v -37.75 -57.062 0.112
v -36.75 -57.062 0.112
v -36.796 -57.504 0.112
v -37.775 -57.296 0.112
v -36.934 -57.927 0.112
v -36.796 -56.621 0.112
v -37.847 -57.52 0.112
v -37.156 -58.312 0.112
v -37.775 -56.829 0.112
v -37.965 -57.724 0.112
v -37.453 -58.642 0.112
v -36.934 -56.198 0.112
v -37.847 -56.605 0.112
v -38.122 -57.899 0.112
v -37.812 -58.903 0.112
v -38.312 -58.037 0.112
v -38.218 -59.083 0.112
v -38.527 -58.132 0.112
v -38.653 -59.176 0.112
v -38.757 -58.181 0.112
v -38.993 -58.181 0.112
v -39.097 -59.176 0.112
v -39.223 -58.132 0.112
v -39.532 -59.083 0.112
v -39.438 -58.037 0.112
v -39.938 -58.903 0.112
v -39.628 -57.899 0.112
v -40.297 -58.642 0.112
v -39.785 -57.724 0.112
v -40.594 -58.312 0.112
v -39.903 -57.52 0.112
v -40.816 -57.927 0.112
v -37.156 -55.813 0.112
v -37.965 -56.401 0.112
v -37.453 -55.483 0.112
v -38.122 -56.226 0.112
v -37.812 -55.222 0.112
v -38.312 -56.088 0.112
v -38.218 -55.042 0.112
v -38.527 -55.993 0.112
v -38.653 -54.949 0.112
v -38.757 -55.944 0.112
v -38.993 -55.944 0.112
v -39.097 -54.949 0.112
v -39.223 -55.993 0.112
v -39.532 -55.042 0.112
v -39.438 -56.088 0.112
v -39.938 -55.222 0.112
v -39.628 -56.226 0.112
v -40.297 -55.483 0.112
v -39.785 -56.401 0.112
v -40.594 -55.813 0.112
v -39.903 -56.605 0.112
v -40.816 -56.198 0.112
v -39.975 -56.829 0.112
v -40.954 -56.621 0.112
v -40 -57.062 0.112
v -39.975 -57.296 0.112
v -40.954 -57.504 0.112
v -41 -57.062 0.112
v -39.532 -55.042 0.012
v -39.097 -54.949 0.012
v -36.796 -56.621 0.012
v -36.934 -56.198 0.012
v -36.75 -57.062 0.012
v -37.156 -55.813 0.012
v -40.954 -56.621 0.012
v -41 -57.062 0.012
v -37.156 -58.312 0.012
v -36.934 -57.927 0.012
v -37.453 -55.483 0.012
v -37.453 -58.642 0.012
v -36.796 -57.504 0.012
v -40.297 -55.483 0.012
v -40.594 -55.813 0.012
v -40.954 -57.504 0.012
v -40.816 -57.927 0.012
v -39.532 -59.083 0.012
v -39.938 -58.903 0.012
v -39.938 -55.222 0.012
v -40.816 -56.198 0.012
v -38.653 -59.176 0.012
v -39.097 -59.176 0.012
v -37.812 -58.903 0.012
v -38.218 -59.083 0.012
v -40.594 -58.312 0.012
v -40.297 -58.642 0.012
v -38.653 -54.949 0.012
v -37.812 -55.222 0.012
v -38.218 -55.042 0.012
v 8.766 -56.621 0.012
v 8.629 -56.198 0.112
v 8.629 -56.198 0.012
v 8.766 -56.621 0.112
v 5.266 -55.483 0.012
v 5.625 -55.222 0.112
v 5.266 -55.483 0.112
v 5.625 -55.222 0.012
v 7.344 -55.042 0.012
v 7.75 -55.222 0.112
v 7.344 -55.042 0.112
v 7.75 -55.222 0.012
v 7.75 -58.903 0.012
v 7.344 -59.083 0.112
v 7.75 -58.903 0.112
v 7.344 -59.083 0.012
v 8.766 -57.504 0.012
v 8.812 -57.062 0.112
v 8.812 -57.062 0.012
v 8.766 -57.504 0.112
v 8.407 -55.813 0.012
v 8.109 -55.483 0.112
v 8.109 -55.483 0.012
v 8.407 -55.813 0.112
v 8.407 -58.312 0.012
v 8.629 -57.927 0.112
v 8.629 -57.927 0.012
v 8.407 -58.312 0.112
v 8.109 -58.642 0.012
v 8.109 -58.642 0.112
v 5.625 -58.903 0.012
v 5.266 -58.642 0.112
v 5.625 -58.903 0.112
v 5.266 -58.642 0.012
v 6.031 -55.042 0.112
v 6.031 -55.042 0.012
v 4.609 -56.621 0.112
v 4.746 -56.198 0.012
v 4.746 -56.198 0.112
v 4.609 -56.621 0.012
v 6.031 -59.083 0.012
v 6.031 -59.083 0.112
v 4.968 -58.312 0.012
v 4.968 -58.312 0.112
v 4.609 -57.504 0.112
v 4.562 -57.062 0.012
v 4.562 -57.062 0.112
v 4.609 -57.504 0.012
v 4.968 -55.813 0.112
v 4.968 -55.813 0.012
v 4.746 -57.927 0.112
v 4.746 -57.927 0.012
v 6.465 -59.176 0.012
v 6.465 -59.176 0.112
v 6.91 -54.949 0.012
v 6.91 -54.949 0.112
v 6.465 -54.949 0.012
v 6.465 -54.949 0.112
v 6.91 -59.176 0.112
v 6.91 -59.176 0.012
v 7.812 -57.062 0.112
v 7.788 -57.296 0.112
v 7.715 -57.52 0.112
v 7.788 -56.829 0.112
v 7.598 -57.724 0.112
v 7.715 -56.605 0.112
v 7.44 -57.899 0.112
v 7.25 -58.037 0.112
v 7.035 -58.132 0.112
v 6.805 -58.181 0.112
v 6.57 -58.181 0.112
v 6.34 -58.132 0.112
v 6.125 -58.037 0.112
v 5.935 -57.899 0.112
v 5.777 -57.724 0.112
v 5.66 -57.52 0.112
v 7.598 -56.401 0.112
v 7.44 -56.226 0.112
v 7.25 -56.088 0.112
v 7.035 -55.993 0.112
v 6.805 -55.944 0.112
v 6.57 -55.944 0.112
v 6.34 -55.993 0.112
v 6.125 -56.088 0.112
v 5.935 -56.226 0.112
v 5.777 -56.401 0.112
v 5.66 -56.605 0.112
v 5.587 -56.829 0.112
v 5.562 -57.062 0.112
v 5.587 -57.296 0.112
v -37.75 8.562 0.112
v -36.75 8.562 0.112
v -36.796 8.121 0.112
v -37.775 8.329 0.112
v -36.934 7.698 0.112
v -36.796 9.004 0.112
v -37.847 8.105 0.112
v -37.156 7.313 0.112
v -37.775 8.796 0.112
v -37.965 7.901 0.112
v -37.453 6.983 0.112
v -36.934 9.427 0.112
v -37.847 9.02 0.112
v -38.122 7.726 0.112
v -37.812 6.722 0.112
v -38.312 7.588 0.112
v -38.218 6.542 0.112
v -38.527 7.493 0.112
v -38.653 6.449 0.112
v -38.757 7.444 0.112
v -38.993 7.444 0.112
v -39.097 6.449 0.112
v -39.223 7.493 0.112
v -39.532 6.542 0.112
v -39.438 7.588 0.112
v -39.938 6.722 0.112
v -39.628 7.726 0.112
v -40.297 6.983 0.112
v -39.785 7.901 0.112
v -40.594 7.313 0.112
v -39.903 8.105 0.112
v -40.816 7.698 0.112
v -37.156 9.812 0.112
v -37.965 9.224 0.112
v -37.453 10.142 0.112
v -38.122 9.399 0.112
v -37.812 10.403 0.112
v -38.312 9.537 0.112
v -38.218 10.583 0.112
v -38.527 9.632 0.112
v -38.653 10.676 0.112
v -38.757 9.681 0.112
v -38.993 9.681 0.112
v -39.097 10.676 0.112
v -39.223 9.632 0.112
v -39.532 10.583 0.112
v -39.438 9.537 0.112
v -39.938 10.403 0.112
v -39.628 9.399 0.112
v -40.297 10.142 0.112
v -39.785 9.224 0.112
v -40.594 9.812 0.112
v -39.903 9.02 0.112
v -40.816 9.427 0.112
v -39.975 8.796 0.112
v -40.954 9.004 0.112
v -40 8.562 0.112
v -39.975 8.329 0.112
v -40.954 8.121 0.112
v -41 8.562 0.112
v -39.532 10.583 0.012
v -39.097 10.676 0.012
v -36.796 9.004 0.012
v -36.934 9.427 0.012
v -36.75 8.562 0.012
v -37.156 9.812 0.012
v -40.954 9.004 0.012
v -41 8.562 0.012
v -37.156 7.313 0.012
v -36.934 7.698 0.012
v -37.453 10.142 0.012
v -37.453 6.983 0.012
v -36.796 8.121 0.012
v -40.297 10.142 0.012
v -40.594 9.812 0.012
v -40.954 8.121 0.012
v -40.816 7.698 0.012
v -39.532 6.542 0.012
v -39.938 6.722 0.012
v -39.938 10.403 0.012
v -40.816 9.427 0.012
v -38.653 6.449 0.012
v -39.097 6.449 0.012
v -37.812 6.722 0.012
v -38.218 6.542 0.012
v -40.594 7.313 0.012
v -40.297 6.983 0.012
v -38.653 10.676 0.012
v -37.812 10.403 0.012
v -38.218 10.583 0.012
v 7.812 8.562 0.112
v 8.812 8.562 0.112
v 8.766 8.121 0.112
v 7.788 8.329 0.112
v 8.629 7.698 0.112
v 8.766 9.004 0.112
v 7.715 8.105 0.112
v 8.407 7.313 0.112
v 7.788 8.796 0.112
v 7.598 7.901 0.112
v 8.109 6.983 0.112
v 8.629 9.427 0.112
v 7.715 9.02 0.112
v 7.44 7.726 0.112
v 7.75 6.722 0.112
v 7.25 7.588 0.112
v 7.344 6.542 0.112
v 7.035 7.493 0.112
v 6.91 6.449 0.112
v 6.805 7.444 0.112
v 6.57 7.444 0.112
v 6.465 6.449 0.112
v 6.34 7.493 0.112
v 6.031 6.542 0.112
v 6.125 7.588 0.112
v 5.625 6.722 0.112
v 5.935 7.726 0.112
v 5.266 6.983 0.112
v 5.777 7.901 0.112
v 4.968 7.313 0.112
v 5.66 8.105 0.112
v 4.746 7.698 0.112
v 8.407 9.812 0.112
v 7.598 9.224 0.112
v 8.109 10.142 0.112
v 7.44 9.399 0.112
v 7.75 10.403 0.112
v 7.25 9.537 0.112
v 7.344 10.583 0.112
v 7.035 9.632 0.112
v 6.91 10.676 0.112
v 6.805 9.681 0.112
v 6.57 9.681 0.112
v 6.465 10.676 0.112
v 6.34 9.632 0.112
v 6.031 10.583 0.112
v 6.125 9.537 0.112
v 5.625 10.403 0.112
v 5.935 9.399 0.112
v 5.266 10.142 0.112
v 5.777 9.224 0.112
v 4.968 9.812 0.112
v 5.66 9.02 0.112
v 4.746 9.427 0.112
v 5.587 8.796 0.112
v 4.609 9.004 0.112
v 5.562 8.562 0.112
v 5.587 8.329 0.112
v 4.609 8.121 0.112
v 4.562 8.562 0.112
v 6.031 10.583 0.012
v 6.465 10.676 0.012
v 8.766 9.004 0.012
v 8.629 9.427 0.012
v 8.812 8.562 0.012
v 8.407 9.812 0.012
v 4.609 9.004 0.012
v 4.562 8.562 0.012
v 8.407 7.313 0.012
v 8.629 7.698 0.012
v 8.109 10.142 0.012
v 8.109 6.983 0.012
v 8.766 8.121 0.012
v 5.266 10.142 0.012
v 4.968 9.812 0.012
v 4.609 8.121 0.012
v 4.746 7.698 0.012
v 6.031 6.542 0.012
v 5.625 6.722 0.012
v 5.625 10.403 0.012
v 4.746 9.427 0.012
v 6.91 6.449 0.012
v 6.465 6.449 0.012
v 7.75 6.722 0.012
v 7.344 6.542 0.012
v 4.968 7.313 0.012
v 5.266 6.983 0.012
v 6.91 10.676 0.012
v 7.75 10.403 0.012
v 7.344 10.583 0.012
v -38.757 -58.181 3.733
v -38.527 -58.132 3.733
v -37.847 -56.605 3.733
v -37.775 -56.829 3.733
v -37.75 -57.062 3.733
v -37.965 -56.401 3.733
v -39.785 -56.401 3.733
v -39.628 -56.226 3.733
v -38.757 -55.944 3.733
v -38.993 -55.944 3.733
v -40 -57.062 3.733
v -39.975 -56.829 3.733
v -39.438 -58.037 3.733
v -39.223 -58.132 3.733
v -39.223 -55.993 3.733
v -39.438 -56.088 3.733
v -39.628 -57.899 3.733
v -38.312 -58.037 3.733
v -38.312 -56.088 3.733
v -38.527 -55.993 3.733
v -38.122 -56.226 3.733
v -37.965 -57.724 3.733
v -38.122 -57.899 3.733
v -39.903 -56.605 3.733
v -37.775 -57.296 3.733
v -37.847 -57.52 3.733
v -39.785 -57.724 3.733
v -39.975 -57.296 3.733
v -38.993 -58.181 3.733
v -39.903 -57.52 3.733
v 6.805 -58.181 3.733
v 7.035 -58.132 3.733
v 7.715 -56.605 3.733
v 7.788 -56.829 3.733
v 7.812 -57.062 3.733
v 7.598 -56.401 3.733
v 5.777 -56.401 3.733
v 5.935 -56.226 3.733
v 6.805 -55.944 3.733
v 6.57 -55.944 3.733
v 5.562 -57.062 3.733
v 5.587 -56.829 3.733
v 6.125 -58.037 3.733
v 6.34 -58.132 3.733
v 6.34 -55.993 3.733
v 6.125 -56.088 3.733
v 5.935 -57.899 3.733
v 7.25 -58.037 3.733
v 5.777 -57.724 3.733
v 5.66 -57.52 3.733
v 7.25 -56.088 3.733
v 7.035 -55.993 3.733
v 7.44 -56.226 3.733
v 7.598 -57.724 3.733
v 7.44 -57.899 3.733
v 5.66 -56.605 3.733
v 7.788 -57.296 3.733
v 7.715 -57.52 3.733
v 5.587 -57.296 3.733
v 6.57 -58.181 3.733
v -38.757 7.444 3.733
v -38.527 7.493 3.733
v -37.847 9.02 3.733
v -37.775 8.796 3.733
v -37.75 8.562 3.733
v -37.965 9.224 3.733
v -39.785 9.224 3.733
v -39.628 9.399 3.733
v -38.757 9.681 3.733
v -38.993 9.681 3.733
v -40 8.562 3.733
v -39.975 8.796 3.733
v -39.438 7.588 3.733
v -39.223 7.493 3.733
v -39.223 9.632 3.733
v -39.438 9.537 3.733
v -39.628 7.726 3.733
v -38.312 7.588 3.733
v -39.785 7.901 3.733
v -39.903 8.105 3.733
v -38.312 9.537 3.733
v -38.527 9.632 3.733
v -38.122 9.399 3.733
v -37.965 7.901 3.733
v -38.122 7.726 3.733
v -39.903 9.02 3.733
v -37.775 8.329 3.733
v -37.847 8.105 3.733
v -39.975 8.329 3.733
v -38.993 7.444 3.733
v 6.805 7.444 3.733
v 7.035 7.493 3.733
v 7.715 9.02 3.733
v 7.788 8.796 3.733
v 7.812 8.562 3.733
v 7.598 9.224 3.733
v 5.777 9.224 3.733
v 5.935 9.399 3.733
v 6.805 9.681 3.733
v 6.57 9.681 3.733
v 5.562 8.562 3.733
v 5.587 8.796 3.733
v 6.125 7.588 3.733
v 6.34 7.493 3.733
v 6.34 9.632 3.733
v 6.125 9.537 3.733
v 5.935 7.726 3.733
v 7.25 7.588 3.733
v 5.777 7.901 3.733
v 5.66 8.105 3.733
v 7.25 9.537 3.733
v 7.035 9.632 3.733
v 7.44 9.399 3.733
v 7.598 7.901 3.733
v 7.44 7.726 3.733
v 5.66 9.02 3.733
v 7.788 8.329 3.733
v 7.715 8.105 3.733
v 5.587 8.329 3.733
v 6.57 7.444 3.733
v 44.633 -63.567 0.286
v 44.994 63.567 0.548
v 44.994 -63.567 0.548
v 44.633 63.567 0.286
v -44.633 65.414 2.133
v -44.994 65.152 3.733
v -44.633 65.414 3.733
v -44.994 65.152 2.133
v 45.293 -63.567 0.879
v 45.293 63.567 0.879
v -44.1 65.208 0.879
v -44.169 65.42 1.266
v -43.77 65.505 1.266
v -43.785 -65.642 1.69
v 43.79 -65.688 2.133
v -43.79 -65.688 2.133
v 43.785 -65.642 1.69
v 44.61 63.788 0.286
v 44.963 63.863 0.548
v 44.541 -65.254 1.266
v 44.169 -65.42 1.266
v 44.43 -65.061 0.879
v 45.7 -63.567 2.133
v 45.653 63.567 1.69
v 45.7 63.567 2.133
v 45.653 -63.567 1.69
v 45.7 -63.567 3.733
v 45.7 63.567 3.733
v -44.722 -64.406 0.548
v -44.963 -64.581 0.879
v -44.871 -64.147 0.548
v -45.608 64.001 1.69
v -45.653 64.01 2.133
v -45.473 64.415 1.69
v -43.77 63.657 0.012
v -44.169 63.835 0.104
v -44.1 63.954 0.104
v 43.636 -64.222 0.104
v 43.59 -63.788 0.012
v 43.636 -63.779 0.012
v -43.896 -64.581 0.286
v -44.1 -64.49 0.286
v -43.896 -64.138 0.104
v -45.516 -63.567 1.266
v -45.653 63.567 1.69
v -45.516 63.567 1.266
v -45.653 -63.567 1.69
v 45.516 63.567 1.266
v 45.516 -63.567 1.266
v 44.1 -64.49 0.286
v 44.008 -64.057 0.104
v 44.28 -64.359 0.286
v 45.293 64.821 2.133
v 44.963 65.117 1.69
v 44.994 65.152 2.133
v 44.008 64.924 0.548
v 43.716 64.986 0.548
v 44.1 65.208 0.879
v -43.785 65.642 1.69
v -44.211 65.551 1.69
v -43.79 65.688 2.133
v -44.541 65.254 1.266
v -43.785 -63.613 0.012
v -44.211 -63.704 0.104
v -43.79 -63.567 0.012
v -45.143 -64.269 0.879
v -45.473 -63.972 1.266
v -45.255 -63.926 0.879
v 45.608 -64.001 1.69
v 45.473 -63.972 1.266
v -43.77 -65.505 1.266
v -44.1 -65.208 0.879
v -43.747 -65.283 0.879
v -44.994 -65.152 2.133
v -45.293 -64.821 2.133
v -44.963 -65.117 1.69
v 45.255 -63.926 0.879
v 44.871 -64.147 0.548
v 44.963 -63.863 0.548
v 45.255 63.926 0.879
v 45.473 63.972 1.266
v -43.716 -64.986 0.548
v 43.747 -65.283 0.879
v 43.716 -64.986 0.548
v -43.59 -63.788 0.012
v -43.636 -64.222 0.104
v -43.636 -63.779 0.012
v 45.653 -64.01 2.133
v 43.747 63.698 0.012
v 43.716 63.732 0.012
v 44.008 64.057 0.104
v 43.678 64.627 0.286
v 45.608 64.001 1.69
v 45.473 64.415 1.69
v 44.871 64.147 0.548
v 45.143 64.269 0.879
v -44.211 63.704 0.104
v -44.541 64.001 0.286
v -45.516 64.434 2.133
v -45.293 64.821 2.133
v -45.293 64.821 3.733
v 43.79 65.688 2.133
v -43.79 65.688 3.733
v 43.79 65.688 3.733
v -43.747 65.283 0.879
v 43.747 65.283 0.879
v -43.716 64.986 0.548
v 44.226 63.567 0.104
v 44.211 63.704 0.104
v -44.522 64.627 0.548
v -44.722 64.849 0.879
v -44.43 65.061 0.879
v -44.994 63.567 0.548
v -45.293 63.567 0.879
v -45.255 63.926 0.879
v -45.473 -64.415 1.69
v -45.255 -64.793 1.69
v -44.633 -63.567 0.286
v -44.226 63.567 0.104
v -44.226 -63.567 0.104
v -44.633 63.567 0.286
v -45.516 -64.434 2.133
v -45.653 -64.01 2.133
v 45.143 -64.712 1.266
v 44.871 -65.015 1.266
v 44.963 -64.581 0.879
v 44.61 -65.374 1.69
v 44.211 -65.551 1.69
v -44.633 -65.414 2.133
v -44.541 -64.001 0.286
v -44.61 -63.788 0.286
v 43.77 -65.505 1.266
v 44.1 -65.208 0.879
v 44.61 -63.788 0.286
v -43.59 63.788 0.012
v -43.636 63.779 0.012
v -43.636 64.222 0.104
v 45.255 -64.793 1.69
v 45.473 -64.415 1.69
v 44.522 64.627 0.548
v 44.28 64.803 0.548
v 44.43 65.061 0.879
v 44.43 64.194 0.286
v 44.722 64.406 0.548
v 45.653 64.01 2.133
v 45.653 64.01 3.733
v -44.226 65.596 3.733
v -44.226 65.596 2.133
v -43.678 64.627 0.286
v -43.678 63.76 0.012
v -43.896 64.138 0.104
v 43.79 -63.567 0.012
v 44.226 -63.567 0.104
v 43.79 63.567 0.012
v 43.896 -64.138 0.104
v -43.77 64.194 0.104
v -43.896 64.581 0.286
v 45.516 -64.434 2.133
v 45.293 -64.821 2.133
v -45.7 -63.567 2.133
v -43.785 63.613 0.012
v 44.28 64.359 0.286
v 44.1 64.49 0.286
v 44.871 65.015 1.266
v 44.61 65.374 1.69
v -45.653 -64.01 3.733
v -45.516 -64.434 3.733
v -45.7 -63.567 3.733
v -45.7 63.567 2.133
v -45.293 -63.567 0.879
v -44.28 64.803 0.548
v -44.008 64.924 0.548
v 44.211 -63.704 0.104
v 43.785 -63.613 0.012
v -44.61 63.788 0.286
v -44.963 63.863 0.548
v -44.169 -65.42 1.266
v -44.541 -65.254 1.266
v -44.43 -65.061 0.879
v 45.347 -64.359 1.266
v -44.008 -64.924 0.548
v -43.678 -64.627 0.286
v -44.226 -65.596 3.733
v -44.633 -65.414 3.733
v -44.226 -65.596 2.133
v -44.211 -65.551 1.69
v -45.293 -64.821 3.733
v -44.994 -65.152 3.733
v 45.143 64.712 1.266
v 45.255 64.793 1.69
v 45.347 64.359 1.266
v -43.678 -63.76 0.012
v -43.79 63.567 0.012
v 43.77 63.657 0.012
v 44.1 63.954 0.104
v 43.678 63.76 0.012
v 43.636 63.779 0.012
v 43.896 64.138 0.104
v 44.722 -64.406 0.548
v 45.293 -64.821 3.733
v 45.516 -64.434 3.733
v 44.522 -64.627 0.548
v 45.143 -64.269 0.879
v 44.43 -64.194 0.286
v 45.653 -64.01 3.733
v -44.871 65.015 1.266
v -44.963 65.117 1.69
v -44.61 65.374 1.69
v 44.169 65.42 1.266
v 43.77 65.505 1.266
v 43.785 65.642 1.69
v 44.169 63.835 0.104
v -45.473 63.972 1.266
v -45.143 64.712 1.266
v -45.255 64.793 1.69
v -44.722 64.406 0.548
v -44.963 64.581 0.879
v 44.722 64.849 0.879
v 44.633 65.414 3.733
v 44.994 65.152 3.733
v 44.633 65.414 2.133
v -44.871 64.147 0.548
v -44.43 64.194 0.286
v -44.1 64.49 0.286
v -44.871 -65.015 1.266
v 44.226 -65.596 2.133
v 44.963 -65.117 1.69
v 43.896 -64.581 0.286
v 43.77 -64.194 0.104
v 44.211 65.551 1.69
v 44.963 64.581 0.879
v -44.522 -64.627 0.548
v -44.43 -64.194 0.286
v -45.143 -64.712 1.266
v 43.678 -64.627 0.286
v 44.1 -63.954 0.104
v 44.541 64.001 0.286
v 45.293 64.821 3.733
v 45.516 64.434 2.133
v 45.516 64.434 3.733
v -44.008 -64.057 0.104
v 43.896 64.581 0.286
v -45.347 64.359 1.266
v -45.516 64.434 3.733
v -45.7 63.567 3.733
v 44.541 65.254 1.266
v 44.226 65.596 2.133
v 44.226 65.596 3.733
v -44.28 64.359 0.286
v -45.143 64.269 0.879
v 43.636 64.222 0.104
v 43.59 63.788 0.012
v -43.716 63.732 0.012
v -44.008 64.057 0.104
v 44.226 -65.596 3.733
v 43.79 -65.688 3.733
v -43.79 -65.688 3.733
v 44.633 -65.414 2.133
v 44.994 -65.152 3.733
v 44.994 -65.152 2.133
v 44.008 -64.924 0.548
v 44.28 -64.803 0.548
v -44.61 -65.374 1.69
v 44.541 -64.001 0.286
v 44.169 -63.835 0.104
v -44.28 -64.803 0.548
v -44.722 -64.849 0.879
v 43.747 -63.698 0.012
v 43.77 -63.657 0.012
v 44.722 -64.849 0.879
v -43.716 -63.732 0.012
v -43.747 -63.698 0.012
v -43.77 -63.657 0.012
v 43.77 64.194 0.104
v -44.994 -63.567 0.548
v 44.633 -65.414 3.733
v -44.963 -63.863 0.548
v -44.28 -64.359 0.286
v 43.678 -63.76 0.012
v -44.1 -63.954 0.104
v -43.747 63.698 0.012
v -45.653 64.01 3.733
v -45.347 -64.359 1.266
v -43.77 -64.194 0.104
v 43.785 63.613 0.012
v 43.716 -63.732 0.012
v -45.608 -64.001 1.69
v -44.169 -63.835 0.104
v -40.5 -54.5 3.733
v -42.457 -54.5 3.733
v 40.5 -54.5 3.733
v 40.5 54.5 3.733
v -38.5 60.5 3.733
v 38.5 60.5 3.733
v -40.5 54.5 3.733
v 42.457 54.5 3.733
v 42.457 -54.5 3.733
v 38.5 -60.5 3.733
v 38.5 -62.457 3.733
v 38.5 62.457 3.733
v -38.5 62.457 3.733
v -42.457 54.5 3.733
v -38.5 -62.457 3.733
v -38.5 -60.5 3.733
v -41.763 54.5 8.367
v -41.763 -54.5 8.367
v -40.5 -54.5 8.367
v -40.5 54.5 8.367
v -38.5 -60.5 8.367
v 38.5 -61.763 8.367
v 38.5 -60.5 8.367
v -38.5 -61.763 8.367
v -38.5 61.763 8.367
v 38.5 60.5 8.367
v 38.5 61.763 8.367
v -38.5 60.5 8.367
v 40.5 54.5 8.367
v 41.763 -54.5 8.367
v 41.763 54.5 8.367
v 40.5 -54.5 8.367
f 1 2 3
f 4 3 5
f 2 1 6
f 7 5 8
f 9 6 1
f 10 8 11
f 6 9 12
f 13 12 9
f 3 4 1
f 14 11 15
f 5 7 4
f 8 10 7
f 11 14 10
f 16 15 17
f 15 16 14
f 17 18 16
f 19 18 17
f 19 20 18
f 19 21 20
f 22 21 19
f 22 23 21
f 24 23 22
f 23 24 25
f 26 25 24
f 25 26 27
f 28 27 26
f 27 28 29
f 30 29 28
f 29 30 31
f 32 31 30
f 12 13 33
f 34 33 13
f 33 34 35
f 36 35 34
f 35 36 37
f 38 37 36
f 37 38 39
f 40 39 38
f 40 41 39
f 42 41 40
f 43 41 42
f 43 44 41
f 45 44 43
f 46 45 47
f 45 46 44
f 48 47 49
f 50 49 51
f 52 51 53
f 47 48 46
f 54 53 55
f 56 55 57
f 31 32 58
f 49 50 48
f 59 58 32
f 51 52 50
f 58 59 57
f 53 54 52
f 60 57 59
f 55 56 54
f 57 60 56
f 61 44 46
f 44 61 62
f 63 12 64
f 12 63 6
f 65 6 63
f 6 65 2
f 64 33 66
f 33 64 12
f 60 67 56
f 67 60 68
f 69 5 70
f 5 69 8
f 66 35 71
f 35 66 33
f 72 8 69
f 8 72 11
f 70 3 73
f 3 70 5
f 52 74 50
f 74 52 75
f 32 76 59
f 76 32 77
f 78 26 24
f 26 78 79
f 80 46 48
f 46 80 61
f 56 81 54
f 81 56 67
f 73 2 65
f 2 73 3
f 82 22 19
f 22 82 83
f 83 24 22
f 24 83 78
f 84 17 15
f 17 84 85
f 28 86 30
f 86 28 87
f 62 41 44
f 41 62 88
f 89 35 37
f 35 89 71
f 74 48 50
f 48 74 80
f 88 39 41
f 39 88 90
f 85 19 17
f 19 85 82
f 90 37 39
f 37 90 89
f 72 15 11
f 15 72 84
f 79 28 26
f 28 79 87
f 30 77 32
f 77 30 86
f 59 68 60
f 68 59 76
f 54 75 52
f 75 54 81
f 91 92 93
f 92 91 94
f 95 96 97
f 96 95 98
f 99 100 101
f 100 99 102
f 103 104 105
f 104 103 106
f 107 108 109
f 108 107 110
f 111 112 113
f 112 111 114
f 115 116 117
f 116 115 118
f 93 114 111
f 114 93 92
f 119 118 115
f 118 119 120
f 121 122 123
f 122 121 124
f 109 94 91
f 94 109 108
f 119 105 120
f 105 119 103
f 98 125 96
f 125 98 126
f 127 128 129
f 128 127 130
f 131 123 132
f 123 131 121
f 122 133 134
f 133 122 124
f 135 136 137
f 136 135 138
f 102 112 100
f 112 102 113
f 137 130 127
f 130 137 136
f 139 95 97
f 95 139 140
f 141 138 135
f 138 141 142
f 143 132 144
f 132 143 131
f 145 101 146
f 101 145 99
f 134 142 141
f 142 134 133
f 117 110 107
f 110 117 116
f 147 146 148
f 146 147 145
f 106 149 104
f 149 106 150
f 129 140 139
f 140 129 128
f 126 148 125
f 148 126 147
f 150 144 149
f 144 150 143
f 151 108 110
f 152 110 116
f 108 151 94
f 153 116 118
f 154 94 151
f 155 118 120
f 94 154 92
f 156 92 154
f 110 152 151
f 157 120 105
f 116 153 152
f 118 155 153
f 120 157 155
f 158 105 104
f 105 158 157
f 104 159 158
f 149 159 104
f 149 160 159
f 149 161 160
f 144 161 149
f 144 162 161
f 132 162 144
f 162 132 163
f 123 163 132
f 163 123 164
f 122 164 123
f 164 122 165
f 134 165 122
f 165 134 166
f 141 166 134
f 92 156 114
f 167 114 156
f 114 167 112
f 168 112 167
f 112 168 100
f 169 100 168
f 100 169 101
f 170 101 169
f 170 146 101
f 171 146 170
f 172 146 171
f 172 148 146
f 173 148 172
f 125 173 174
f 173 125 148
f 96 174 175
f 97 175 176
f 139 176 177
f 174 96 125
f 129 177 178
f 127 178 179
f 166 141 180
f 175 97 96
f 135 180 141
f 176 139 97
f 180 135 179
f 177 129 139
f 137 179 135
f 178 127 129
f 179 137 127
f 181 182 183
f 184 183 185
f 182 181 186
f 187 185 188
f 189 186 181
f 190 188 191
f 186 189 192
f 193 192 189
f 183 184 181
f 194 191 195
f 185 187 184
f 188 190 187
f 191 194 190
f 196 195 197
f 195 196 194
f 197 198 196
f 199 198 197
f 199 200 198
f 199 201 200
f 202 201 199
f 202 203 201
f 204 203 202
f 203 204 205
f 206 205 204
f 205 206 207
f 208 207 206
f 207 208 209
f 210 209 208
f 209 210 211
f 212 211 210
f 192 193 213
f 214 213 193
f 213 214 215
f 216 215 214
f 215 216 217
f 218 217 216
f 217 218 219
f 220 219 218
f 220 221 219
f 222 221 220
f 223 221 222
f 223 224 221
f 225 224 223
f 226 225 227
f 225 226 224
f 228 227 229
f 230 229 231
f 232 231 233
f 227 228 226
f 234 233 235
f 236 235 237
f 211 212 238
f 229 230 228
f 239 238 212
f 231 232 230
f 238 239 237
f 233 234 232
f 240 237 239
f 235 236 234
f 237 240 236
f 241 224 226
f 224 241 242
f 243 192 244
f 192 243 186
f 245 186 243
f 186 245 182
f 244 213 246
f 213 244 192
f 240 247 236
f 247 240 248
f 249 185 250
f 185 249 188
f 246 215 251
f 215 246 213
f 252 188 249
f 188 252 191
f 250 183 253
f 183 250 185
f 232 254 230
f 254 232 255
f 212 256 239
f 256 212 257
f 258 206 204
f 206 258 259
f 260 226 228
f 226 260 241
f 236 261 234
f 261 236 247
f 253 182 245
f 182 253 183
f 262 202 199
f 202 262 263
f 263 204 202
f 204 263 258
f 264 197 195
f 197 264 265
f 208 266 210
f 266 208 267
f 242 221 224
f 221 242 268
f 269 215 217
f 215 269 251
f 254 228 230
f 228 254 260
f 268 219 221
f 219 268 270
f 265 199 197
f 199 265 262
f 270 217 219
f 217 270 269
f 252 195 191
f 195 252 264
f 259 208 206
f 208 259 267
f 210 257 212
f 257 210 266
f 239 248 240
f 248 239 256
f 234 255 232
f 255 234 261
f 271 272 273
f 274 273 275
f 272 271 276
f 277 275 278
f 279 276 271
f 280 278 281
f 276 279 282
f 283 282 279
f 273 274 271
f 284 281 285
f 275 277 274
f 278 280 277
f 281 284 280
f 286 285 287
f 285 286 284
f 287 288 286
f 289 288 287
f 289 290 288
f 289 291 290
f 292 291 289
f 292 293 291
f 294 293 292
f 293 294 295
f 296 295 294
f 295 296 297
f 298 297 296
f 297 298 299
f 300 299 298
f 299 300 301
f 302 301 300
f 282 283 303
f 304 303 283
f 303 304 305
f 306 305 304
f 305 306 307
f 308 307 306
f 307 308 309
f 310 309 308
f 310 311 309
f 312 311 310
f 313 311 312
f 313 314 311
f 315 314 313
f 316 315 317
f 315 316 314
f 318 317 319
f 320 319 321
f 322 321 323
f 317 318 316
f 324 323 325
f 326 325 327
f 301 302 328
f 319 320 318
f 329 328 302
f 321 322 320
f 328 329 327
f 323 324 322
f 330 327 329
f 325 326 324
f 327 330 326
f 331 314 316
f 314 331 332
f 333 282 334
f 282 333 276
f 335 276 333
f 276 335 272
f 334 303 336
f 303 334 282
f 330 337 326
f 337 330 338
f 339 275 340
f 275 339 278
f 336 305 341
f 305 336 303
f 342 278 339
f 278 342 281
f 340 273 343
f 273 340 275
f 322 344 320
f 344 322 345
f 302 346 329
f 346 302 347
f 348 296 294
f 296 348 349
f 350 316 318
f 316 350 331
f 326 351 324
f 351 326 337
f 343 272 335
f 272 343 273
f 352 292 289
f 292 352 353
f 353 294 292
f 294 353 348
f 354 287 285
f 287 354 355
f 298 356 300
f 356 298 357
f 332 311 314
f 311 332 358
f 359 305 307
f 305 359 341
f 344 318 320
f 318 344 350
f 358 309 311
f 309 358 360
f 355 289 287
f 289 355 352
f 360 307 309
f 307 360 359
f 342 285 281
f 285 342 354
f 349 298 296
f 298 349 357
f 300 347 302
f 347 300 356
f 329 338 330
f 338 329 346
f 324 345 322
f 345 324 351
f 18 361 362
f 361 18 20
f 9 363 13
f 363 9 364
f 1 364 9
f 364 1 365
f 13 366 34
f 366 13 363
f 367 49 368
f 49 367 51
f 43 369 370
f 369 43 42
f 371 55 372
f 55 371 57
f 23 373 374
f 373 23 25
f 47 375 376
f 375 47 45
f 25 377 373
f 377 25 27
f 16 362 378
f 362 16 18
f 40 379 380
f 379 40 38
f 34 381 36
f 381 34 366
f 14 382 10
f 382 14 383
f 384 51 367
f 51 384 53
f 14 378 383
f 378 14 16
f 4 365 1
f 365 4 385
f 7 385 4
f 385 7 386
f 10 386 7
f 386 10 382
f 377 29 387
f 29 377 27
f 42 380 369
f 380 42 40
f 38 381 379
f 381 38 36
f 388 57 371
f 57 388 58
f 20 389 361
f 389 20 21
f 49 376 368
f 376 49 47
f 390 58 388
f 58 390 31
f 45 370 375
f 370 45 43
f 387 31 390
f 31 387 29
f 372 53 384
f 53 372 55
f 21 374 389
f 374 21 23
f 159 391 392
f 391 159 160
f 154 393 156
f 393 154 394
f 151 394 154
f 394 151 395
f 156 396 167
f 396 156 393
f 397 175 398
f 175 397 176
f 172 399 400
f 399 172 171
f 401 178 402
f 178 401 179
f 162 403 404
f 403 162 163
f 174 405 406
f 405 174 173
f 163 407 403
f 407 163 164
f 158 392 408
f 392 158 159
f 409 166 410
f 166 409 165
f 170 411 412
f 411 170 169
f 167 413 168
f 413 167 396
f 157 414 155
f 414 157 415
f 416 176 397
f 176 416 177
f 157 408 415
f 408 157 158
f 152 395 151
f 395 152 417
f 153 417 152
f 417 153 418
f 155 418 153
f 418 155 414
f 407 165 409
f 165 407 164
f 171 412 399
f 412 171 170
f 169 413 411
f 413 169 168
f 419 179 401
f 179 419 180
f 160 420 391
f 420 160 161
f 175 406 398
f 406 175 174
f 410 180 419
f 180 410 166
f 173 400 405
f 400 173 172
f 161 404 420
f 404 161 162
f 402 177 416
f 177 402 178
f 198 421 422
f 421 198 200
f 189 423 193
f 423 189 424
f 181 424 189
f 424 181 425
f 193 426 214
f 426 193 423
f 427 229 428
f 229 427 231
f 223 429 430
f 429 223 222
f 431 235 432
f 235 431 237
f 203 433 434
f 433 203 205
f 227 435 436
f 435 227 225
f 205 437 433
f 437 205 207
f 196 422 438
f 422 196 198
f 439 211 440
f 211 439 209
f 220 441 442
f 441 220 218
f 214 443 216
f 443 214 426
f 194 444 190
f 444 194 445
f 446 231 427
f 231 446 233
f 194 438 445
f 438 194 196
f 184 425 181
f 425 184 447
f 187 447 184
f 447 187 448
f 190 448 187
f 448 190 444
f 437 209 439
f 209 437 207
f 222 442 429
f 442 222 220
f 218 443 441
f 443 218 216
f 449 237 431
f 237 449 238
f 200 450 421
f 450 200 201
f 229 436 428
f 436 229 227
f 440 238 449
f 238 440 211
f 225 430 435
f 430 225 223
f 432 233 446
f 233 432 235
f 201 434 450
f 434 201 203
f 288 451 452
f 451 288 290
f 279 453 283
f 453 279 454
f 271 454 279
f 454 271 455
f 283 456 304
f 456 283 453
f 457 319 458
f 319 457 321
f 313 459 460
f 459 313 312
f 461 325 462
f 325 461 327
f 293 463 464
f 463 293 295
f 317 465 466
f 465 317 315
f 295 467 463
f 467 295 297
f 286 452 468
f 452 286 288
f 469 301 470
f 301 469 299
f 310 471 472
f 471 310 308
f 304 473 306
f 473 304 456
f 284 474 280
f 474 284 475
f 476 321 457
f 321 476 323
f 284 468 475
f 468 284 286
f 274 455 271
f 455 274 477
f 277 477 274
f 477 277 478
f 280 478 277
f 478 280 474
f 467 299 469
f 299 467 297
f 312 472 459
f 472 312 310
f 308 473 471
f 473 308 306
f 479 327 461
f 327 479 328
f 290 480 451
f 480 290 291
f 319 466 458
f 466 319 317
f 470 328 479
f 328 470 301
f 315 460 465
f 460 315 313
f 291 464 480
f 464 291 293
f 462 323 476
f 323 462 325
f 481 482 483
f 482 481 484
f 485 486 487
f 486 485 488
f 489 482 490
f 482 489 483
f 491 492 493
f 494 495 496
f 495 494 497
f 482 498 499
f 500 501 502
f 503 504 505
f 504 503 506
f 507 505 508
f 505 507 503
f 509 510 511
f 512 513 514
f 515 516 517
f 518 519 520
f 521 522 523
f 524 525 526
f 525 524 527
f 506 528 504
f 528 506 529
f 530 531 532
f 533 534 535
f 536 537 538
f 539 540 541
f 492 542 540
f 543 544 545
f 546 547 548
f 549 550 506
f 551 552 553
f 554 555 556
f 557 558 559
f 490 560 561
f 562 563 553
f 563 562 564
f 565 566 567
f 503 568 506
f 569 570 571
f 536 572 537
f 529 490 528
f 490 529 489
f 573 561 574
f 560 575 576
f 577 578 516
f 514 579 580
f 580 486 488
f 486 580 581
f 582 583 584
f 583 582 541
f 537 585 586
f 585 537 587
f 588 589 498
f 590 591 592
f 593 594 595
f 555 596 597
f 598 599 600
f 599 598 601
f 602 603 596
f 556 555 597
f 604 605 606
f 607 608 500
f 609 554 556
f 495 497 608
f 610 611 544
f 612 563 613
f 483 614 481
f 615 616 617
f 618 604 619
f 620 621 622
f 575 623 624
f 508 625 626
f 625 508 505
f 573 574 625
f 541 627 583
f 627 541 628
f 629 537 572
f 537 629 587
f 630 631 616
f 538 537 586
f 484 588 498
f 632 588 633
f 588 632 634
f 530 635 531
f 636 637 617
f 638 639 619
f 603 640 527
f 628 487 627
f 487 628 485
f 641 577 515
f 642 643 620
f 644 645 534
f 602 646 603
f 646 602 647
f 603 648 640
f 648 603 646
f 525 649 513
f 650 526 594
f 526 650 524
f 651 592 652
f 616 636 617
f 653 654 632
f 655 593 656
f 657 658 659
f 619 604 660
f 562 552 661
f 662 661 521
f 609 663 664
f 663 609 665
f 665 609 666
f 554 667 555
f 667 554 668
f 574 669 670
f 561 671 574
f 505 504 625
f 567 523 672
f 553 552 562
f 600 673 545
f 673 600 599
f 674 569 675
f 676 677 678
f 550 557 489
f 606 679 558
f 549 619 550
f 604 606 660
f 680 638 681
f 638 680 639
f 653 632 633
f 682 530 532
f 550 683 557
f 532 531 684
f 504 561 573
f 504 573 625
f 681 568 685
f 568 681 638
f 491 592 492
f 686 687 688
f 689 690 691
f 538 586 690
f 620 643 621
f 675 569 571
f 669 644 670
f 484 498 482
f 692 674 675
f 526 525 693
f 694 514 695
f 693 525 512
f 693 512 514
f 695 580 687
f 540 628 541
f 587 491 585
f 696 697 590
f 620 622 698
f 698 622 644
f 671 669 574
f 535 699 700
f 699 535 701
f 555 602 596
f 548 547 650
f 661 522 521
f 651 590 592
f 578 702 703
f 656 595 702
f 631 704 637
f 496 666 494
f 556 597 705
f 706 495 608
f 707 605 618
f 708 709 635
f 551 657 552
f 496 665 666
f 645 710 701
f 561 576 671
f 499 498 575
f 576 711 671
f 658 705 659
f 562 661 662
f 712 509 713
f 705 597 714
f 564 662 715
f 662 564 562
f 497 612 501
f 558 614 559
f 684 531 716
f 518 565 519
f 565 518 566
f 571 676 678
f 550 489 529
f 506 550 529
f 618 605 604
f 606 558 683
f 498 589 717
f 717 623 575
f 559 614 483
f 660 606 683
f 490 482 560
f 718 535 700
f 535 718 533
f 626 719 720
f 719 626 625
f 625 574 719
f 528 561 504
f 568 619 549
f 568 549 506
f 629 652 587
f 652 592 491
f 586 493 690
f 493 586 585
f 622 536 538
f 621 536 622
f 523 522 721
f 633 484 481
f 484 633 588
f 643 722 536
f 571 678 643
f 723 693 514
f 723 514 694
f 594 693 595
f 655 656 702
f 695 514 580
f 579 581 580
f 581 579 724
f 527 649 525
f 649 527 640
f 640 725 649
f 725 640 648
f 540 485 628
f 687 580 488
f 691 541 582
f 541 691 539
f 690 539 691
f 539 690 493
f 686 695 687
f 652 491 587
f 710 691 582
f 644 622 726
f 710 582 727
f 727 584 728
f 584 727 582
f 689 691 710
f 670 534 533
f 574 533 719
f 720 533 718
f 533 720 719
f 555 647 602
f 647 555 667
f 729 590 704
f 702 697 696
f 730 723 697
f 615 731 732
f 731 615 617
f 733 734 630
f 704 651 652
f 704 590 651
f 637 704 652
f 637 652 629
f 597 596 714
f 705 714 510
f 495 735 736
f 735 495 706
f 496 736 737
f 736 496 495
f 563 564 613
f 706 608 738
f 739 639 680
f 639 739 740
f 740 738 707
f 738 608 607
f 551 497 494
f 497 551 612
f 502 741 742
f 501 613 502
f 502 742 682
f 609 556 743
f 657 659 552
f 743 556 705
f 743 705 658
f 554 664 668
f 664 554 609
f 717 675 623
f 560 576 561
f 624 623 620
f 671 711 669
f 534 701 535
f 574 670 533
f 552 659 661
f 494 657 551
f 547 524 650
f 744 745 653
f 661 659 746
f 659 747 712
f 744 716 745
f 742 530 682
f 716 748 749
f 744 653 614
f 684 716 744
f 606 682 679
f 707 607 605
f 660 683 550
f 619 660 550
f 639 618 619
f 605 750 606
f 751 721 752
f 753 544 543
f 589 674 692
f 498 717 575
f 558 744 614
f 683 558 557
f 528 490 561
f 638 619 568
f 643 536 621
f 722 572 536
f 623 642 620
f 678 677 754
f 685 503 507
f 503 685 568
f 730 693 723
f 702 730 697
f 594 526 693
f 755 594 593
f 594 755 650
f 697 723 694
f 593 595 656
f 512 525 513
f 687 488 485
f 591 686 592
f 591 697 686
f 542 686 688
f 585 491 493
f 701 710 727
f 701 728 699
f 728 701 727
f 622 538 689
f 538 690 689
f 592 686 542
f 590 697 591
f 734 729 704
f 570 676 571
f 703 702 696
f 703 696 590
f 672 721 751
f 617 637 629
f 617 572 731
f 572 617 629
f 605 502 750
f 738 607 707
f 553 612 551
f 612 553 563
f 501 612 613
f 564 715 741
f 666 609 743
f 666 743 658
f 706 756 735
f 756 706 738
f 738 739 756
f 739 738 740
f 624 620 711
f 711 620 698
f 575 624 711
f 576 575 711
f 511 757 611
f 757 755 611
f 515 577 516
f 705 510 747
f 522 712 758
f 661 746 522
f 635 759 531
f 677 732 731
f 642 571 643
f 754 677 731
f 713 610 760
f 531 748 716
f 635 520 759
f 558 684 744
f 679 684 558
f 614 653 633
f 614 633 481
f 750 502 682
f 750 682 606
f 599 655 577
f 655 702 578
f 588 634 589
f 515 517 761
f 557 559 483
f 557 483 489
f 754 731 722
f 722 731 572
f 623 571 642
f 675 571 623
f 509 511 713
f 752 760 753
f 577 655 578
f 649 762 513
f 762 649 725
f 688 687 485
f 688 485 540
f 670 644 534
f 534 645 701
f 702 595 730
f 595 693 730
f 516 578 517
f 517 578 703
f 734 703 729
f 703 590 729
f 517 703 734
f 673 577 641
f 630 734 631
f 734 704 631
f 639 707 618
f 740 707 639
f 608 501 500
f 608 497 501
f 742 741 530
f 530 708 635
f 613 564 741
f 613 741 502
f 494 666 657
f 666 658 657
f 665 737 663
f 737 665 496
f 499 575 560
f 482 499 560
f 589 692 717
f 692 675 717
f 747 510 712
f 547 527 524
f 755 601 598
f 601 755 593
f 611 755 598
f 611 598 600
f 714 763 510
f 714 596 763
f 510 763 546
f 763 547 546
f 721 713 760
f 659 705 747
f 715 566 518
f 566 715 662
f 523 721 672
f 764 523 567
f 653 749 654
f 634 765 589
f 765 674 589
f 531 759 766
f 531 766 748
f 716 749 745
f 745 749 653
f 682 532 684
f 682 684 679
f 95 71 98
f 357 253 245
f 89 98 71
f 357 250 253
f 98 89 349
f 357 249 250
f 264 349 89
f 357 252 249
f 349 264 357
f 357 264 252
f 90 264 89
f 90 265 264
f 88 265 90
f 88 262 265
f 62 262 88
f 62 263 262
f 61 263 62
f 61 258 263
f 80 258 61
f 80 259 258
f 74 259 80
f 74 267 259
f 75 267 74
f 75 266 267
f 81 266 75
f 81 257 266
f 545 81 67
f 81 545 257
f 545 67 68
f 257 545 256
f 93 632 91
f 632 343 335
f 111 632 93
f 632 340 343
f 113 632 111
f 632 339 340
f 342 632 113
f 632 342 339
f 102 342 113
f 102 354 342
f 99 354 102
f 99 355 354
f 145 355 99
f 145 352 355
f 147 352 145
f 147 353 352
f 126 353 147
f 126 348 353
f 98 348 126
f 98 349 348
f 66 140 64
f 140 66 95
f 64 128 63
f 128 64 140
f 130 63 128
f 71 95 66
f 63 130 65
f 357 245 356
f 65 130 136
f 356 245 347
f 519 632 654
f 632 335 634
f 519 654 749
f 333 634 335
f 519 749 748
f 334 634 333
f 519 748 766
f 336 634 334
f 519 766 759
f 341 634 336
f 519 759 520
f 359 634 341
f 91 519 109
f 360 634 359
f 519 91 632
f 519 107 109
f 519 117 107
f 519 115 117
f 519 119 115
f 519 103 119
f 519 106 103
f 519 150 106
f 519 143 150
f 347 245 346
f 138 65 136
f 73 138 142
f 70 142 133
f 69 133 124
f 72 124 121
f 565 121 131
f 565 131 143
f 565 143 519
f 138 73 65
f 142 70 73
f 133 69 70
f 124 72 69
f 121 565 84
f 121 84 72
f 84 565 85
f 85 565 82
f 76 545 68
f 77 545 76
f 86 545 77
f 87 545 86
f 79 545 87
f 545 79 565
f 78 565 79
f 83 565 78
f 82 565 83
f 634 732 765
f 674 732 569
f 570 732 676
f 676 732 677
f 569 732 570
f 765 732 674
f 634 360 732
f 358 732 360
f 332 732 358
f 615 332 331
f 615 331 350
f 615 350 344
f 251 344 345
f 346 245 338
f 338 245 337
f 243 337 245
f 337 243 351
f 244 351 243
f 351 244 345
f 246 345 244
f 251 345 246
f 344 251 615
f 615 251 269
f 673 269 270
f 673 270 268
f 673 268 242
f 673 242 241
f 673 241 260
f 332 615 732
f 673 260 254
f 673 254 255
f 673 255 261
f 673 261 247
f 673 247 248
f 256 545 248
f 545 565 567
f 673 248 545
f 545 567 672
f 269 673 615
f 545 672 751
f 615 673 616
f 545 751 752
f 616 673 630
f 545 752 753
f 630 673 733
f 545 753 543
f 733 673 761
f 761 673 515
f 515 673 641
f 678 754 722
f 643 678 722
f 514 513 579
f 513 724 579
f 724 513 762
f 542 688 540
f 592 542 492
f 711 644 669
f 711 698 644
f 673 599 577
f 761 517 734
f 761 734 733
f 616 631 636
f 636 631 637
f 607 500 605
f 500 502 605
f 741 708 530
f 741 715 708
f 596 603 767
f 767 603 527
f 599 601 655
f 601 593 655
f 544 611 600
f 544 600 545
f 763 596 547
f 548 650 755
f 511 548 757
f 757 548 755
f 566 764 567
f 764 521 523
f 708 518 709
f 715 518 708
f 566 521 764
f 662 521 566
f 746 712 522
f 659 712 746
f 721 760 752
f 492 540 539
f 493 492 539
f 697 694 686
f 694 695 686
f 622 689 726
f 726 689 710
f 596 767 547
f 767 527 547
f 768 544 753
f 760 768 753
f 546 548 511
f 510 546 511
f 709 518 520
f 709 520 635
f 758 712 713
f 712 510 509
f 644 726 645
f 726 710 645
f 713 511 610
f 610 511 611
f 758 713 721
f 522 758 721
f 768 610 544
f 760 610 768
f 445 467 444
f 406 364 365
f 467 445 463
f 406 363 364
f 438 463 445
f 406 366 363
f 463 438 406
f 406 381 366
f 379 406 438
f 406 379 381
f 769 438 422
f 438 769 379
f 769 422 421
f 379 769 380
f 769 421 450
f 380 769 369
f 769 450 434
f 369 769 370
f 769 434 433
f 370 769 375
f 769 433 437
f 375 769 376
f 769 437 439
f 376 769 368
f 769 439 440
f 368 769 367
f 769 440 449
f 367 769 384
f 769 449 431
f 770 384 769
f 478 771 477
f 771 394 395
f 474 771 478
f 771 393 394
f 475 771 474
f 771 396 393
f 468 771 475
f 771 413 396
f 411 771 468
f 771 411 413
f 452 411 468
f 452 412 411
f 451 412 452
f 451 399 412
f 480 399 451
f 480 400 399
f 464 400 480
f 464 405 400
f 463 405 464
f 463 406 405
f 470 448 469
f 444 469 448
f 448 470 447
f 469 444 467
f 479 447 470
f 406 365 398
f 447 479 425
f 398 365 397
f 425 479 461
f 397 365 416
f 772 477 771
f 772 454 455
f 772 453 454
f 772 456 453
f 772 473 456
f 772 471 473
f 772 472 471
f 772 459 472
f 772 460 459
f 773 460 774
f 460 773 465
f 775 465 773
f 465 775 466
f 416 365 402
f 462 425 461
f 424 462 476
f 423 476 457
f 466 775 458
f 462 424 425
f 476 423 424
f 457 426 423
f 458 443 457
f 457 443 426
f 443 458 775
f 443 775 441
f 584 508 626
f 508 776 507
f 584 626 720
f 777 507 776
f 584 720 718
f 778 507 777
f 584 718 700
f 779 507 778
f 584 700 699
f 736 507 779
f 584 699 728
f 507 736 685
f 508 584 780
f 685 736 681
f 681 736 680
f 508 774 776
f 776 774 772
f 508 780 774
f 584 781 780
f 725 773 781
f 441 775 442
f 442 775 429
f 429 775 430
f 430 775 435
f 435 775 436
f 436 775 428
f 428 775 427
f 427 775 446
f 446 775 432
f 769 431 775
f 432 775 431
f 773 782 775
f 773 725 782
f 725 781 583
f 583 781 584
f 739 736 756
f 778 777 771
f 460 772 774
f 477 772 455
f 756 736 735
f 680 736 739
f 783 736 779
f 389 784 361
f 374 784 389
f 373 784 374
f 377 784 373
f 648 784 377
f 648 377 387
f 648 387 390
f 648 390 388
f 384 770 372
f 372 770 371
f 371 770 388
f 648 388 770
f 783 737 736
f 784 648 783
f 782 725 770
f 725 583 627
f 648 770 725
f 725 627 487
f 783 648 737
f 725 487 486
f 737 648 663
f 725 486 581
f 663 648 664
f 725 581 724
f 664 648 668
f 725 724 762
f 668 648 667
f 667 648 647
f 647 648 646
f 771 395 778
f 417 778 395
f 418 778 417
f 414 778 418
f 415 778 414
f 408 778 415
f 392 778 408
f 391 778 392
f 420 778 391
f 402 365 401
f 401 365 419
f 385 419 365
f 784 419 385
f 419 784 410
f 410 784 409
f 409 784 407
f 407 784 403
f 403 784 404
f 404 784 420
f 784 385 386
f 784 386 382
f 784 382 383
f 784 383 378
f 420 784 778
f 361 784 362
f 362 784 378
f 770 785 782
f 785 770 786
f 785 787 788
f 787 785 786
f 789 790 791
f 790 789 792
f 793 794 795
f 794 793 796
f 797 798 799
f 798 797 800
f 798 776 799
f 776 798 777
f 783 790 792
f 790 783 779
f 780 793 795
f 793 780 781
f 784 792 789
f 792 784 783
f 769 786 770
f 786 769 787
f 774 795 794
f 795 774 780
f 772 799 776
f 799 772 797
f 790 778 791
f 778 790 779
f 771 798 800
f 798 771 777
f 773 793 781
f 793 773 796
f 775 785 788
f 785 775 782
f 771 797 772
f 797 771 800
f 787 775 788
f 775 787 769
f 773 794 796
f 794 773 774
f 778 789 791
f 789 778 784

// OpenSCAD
//2000 = 125mm
//1 = 62.5um


//Poprawki w proporcjach (odległości między gwintami na PCB)

scale = 1000;//85x125mm(wnętrze)
//d = 32;
d = 51.2;//3.2mm
HoleSize = 48;//3mm

scale(0.0625)//skalowanie
{
    //BOX();
    //color("green")
    //translate([scale*2, 0, 0])
        //rotate([0, 180, 0])
        //translate([0, 0, -scale*0.55-5]) //<-zamkniecie pudelka ;)
            LID();
}

module BOX()
{
union()
{
    TrzymadelkaDoPB();
    TrzymadelkoDoDPDT();
difference()
{
    union(){
        Boxxy();
        PCBTower();
    }
    OtworyNaPCB();
    SensorsHolderHoles();
    SensorsHoles();
    
    ConnectButtonHole();
    OnOffHole();
}}}

module TrzymadelkaDoPB()
{
    //trzymadelka do powerbanku
       translate([-228-60+1,800,d/3])
            cube([64, 200, 200]);
            
       translate([-228-60+1,-816+198 - 32,d/3])
            cube([64, 200, 200]);
       translate([-680,-816+198 - 32,d/3])
            cube([450, 64, 8*16]);
}

module TrzymadelkoDoDPDT()
{
    translate([13.6+62, 215, 0]){
    translate([430,25,0])
        cube([70, 240, 150]);
    translate([430,25,0])
        cube([70, 47.5+12, 250]);
    translate([430,217.5-12,0])
        cube([70, 47.5+12, 250]);}
}

module OtworyNaPCB()
{
    //rosuniecie wszystkich otworow od siebie o 2mm -> 32
    translate([-160 + 16, -950, 21 - HoleSize + 32 + 6.4])
        {
         translate([25+1.75*16 - 16,25+1.75*16 - 16,0])
        cylinder(r1 = HoleSize/2, r2 = HoleSize/2, h = 2*64);
         translate([50*16 - 22 - 1.75*16 + 16,25+1.75*16 - 16,0])
        cylinder(r1 = HoleSize/2, r2 = HoleSize/2, h = 2*64); 
         translate([25+1.75*16 - 16,25 + 16 * 68-14 - 1.75*16 + 16,0])
        cylinder(r1 = HoleSize/2, r2 = HoleSize/2, h = 2*64); 
         translate([50*16 - 22 - 1.75*16 + 16,25 + 16 * 68-14 - 1.75*16 + 16,0])
        cylinder(r1 = HoleSize/2, r2 = HoleSize/2, h = 2*64);        
        }    
}

module OtworyNaSruby()
{
    //rosuniecie wszystkich otworow od siebie o 2mm -> 32
    translate([-160 + 16, -950, 21 - HoleSize + 32])
        {
         translate([25+1.75*16 - 16,25+1.75*16 - 16,0])
        cylinder(r1 = HoleSize/2 + 10, r2 = HoleSize/2 + 10, h = 2*64);
         translate([50*16 - 22 - 1.75*16 + 16,25+1.75*16 - 16,0])
        cylinder(r1 = HoleSize/2 + 10, r2 = HoleSize/2 + 10, h = 2*64); 
         translate([25+1.75*16 - 16,25 + 16 * 68-14 - 1.75*16 + 16,0])
        cylinder(r1 = HoleSize/2 + 10, r2 = HoleSize/2 + 10, h = 2*64); 
         translate([50*16 - 22 - 1.75*16 + 16,25 + 16 * 68-14 - 1.75*16 + 16,0])
        cylinder(r1 = HoleSize/2 + 10, r2 = HoleSize/2 + 10, h = 2*64);        
        }    
}

module OtworyMniejsze()
{
    translate([-160 + 16, -950, 21 - HoleSize])
        {
         translate([25+1.75*16 - 16,25+1.75*16 - 16,0])
        cylinder(r1 = 18, r2 = 18, h = 2*64);
         translate([50*16 - 22 - 1.75*16 + 16,25+1.75*16 - 16,0])
        cylinder(r1 = 18, r2 = 18, h = 2*64); 
         translate([25+0.75*16,25 + 16 * 68-14 - 1.75*16 + 16,0])
        cylinder(r1 = 18, r2 = 18, h = 2*64); 
         translate([50*16 - 22 - 1.75*16 + 16,25 + 16 * 68-14 - 1.75*16 + 16,0])
        cylinder(r1 = 18, r2 = 18, h = 2*64);        
        }    
}

module PCBTower()
{
    //rzosuniecie wszystkich otworow od siebie o 2mm -> 32
    translate([-160 + 16, -950, 21 - HoleSize + 32 + 40 + 6.4])
        {
         translate([25+1.75*16 - 16,25+1.75*16 - 16 - 20,0])
        cube([96, 96 + 40, 2*64 - 48], true);
         translate([50*16 - 22 - 1.75*16 + 16 + 5,25+1.75*16 - 16 - 20,0])
        cube([96 + 10, 96 + 40, 2*64 - 48], true);
         translate([25+1.75*16 - 16,25 + 16 * 68-14 - 1.75*16 + 16,0])
        cube([96, 96, 2*64 - 48], true); 
        translate([50*16 - 22 - 1.75*16 + 31,25 + 16 * 68-14 - 1.75*16 + 16,0])
        cube([96 + 15, 96, 2*64 - 48], true);
       }    
}

module OnOffHole()
{
    translate([scale/2 + 3*64, -scale*0.8, scale/4+40])
        cube([3*64, 6*16, 3*16], true);
    translate([scale/2 + 1.85*64, -scale*0.8, scale/4+40])
        cube([2.5*64, 10.5*16, 5.5*16], true);
}

module ConnectButtonHole()
{
    translate([650, 360, 64+6+129-12 + 30])
    rotate([0, 90, 0])
        cylinder(r1 = 80, r2 = 80, h = 2*64);
}

module SensorsHolderHoles()
{
    translate([50, 921 + 1.14*16, -d/4 + 101 - 80 + 24.8])
        cylinder(r1 = HoleSize/2, r2 = HoleSize/2, h = 2*64);
    
    translate ([320, 797+74, -64/4 + 37 - 48 + 32]){
    translate([-24-47 + 4, 0, 0]) // zblizenie otworow o 0.5mm, odleglosc przed zmiana 5.92mm -> -4 dla obu
        cylinder(r1 = HoleSize/2, r2 = HoleSize/2, h = 1.5*d);
    translate([24+47 - 4, 0, 0])
        cylinder(r1 = HoleSize/2, r2 = HoleSize/2, h = 1.5*d);}
}

module SensorsHoles()
{
translate([50, 750-12, 32]){
minkowski(){
        cube([240-160, 320-160, 100], true);
        sphere(80);
    }
    translate([0, 0, 7.566 + 64 - 40])
        cube([240, 320, 100], true);
}
    minkowski(){
    translate([320, 800, -20 + 32])
        cylinder($fn = 4, r2 = 10, r1 = 30, h = 60, center = true);
        sphere(20);
    }
}

module Boxxy()
{
    union(){
    translate([224 + 15 - 300 - 120 - 60, scale - 1.5*64, 0])
        cube([224 + 120+64, 1.5*64, 81 + 32]);//holder przy DHT
    
    Wregi();
        
    difference(){
    minkowski(){
    translate([0, 0, scale/4])
        cube([1.36*scale + 2*d/3, 2*scale + 2*d/3, scale/2], true);//pudło
    sphere(2*d/3);
    }
    translate([0, 0, scale*0.75 - 2.4*16 + 21])
        cube([2*scale, 4*scale, scale/2], true);//wygladzenie z gory
    
    translate([0, 0, scale/2 + d/3 + 32])
        cube([1.36*scale, 2*scale, scale], true);//pustka
    
    translate([-220-60-50, 300, 0])
        cube([100, 200, 50]);
    
    //korytko do wyciagania pb
    
    translate([-100, -1075, 440])
        cube([200, 50, 50]);
    
    //łapacz do pokrywki
}}
}

module Wregi()
{
    translate([-680,-1000,0])
        cube([32, 32, 483]);
    translate([680 - 32,1000 - 32,0])
        cube([32, 32, 483]);
    translate([680 - 32,-1000,0])
        cube([32, 32, 483]);
    translate([-680,1000 -32,0])
        cube([32, 32, 483]);
}

module WregiLID()
{
    translate([-680,-1000,0])
        cube([64, 128, 483]);
    translate([680 - 64,1000 - 128,0])
        cube([64, 128, 483]);
    translate([680 - 64,-1000,0])
        cube([64, 128, 483]);
    translate([-680,1000 - 128,0])
        cube([64, 128, 483]);
}

module LID()
{
union()
{
    difference(){
    minkowski(){
    translate([0, 0, d])
        cube([1.36*scale + 2*d/3, 2*scale + 2*d/3, 2*d/3], true);
        sphere(2*d/3);
    }
    translate([0, 0, 2*d - d/3])
        cube([2*scale, 4*scale , d], true);
    
    translate ([-scale/2 - 15, 0, 0]){
    translate ([0, 0, -d - 80])
        //OtworyNaPCB();
        OtworyNaSruby();
    translate ([0, 0, 0])
        OtworyMniejsze();
    }
    }
    difference()
    {
        translate([0, 0, 2*d - 10])
            magic();
        translate([0, 0, 2*d])
            cube([1.36*scale - 64, 2*scale - 64, 3*64], true);
        WregiLID();
    }
}
}

module magic()
{
    //cube([1.36*scale, 2*scale, d + 16], true);
    translate([0, -320, -2*d/3])
    rotate([0, 0, -45])
    cylinder(h = d+16 
     +2.4 + 6, r1 = scale - 32 - 7, r2 = scale - 16 - 32 - 7, $fn = 4);
    
    translate([0, 320, -2*d/3])
    rotate([0, 0, -45])
    cylinder(h = d+16 + 2.4 + 6, r1 = scale - 32 - 7, r2 = scale - 16 - 32 - 7, $fn = 4);
}
